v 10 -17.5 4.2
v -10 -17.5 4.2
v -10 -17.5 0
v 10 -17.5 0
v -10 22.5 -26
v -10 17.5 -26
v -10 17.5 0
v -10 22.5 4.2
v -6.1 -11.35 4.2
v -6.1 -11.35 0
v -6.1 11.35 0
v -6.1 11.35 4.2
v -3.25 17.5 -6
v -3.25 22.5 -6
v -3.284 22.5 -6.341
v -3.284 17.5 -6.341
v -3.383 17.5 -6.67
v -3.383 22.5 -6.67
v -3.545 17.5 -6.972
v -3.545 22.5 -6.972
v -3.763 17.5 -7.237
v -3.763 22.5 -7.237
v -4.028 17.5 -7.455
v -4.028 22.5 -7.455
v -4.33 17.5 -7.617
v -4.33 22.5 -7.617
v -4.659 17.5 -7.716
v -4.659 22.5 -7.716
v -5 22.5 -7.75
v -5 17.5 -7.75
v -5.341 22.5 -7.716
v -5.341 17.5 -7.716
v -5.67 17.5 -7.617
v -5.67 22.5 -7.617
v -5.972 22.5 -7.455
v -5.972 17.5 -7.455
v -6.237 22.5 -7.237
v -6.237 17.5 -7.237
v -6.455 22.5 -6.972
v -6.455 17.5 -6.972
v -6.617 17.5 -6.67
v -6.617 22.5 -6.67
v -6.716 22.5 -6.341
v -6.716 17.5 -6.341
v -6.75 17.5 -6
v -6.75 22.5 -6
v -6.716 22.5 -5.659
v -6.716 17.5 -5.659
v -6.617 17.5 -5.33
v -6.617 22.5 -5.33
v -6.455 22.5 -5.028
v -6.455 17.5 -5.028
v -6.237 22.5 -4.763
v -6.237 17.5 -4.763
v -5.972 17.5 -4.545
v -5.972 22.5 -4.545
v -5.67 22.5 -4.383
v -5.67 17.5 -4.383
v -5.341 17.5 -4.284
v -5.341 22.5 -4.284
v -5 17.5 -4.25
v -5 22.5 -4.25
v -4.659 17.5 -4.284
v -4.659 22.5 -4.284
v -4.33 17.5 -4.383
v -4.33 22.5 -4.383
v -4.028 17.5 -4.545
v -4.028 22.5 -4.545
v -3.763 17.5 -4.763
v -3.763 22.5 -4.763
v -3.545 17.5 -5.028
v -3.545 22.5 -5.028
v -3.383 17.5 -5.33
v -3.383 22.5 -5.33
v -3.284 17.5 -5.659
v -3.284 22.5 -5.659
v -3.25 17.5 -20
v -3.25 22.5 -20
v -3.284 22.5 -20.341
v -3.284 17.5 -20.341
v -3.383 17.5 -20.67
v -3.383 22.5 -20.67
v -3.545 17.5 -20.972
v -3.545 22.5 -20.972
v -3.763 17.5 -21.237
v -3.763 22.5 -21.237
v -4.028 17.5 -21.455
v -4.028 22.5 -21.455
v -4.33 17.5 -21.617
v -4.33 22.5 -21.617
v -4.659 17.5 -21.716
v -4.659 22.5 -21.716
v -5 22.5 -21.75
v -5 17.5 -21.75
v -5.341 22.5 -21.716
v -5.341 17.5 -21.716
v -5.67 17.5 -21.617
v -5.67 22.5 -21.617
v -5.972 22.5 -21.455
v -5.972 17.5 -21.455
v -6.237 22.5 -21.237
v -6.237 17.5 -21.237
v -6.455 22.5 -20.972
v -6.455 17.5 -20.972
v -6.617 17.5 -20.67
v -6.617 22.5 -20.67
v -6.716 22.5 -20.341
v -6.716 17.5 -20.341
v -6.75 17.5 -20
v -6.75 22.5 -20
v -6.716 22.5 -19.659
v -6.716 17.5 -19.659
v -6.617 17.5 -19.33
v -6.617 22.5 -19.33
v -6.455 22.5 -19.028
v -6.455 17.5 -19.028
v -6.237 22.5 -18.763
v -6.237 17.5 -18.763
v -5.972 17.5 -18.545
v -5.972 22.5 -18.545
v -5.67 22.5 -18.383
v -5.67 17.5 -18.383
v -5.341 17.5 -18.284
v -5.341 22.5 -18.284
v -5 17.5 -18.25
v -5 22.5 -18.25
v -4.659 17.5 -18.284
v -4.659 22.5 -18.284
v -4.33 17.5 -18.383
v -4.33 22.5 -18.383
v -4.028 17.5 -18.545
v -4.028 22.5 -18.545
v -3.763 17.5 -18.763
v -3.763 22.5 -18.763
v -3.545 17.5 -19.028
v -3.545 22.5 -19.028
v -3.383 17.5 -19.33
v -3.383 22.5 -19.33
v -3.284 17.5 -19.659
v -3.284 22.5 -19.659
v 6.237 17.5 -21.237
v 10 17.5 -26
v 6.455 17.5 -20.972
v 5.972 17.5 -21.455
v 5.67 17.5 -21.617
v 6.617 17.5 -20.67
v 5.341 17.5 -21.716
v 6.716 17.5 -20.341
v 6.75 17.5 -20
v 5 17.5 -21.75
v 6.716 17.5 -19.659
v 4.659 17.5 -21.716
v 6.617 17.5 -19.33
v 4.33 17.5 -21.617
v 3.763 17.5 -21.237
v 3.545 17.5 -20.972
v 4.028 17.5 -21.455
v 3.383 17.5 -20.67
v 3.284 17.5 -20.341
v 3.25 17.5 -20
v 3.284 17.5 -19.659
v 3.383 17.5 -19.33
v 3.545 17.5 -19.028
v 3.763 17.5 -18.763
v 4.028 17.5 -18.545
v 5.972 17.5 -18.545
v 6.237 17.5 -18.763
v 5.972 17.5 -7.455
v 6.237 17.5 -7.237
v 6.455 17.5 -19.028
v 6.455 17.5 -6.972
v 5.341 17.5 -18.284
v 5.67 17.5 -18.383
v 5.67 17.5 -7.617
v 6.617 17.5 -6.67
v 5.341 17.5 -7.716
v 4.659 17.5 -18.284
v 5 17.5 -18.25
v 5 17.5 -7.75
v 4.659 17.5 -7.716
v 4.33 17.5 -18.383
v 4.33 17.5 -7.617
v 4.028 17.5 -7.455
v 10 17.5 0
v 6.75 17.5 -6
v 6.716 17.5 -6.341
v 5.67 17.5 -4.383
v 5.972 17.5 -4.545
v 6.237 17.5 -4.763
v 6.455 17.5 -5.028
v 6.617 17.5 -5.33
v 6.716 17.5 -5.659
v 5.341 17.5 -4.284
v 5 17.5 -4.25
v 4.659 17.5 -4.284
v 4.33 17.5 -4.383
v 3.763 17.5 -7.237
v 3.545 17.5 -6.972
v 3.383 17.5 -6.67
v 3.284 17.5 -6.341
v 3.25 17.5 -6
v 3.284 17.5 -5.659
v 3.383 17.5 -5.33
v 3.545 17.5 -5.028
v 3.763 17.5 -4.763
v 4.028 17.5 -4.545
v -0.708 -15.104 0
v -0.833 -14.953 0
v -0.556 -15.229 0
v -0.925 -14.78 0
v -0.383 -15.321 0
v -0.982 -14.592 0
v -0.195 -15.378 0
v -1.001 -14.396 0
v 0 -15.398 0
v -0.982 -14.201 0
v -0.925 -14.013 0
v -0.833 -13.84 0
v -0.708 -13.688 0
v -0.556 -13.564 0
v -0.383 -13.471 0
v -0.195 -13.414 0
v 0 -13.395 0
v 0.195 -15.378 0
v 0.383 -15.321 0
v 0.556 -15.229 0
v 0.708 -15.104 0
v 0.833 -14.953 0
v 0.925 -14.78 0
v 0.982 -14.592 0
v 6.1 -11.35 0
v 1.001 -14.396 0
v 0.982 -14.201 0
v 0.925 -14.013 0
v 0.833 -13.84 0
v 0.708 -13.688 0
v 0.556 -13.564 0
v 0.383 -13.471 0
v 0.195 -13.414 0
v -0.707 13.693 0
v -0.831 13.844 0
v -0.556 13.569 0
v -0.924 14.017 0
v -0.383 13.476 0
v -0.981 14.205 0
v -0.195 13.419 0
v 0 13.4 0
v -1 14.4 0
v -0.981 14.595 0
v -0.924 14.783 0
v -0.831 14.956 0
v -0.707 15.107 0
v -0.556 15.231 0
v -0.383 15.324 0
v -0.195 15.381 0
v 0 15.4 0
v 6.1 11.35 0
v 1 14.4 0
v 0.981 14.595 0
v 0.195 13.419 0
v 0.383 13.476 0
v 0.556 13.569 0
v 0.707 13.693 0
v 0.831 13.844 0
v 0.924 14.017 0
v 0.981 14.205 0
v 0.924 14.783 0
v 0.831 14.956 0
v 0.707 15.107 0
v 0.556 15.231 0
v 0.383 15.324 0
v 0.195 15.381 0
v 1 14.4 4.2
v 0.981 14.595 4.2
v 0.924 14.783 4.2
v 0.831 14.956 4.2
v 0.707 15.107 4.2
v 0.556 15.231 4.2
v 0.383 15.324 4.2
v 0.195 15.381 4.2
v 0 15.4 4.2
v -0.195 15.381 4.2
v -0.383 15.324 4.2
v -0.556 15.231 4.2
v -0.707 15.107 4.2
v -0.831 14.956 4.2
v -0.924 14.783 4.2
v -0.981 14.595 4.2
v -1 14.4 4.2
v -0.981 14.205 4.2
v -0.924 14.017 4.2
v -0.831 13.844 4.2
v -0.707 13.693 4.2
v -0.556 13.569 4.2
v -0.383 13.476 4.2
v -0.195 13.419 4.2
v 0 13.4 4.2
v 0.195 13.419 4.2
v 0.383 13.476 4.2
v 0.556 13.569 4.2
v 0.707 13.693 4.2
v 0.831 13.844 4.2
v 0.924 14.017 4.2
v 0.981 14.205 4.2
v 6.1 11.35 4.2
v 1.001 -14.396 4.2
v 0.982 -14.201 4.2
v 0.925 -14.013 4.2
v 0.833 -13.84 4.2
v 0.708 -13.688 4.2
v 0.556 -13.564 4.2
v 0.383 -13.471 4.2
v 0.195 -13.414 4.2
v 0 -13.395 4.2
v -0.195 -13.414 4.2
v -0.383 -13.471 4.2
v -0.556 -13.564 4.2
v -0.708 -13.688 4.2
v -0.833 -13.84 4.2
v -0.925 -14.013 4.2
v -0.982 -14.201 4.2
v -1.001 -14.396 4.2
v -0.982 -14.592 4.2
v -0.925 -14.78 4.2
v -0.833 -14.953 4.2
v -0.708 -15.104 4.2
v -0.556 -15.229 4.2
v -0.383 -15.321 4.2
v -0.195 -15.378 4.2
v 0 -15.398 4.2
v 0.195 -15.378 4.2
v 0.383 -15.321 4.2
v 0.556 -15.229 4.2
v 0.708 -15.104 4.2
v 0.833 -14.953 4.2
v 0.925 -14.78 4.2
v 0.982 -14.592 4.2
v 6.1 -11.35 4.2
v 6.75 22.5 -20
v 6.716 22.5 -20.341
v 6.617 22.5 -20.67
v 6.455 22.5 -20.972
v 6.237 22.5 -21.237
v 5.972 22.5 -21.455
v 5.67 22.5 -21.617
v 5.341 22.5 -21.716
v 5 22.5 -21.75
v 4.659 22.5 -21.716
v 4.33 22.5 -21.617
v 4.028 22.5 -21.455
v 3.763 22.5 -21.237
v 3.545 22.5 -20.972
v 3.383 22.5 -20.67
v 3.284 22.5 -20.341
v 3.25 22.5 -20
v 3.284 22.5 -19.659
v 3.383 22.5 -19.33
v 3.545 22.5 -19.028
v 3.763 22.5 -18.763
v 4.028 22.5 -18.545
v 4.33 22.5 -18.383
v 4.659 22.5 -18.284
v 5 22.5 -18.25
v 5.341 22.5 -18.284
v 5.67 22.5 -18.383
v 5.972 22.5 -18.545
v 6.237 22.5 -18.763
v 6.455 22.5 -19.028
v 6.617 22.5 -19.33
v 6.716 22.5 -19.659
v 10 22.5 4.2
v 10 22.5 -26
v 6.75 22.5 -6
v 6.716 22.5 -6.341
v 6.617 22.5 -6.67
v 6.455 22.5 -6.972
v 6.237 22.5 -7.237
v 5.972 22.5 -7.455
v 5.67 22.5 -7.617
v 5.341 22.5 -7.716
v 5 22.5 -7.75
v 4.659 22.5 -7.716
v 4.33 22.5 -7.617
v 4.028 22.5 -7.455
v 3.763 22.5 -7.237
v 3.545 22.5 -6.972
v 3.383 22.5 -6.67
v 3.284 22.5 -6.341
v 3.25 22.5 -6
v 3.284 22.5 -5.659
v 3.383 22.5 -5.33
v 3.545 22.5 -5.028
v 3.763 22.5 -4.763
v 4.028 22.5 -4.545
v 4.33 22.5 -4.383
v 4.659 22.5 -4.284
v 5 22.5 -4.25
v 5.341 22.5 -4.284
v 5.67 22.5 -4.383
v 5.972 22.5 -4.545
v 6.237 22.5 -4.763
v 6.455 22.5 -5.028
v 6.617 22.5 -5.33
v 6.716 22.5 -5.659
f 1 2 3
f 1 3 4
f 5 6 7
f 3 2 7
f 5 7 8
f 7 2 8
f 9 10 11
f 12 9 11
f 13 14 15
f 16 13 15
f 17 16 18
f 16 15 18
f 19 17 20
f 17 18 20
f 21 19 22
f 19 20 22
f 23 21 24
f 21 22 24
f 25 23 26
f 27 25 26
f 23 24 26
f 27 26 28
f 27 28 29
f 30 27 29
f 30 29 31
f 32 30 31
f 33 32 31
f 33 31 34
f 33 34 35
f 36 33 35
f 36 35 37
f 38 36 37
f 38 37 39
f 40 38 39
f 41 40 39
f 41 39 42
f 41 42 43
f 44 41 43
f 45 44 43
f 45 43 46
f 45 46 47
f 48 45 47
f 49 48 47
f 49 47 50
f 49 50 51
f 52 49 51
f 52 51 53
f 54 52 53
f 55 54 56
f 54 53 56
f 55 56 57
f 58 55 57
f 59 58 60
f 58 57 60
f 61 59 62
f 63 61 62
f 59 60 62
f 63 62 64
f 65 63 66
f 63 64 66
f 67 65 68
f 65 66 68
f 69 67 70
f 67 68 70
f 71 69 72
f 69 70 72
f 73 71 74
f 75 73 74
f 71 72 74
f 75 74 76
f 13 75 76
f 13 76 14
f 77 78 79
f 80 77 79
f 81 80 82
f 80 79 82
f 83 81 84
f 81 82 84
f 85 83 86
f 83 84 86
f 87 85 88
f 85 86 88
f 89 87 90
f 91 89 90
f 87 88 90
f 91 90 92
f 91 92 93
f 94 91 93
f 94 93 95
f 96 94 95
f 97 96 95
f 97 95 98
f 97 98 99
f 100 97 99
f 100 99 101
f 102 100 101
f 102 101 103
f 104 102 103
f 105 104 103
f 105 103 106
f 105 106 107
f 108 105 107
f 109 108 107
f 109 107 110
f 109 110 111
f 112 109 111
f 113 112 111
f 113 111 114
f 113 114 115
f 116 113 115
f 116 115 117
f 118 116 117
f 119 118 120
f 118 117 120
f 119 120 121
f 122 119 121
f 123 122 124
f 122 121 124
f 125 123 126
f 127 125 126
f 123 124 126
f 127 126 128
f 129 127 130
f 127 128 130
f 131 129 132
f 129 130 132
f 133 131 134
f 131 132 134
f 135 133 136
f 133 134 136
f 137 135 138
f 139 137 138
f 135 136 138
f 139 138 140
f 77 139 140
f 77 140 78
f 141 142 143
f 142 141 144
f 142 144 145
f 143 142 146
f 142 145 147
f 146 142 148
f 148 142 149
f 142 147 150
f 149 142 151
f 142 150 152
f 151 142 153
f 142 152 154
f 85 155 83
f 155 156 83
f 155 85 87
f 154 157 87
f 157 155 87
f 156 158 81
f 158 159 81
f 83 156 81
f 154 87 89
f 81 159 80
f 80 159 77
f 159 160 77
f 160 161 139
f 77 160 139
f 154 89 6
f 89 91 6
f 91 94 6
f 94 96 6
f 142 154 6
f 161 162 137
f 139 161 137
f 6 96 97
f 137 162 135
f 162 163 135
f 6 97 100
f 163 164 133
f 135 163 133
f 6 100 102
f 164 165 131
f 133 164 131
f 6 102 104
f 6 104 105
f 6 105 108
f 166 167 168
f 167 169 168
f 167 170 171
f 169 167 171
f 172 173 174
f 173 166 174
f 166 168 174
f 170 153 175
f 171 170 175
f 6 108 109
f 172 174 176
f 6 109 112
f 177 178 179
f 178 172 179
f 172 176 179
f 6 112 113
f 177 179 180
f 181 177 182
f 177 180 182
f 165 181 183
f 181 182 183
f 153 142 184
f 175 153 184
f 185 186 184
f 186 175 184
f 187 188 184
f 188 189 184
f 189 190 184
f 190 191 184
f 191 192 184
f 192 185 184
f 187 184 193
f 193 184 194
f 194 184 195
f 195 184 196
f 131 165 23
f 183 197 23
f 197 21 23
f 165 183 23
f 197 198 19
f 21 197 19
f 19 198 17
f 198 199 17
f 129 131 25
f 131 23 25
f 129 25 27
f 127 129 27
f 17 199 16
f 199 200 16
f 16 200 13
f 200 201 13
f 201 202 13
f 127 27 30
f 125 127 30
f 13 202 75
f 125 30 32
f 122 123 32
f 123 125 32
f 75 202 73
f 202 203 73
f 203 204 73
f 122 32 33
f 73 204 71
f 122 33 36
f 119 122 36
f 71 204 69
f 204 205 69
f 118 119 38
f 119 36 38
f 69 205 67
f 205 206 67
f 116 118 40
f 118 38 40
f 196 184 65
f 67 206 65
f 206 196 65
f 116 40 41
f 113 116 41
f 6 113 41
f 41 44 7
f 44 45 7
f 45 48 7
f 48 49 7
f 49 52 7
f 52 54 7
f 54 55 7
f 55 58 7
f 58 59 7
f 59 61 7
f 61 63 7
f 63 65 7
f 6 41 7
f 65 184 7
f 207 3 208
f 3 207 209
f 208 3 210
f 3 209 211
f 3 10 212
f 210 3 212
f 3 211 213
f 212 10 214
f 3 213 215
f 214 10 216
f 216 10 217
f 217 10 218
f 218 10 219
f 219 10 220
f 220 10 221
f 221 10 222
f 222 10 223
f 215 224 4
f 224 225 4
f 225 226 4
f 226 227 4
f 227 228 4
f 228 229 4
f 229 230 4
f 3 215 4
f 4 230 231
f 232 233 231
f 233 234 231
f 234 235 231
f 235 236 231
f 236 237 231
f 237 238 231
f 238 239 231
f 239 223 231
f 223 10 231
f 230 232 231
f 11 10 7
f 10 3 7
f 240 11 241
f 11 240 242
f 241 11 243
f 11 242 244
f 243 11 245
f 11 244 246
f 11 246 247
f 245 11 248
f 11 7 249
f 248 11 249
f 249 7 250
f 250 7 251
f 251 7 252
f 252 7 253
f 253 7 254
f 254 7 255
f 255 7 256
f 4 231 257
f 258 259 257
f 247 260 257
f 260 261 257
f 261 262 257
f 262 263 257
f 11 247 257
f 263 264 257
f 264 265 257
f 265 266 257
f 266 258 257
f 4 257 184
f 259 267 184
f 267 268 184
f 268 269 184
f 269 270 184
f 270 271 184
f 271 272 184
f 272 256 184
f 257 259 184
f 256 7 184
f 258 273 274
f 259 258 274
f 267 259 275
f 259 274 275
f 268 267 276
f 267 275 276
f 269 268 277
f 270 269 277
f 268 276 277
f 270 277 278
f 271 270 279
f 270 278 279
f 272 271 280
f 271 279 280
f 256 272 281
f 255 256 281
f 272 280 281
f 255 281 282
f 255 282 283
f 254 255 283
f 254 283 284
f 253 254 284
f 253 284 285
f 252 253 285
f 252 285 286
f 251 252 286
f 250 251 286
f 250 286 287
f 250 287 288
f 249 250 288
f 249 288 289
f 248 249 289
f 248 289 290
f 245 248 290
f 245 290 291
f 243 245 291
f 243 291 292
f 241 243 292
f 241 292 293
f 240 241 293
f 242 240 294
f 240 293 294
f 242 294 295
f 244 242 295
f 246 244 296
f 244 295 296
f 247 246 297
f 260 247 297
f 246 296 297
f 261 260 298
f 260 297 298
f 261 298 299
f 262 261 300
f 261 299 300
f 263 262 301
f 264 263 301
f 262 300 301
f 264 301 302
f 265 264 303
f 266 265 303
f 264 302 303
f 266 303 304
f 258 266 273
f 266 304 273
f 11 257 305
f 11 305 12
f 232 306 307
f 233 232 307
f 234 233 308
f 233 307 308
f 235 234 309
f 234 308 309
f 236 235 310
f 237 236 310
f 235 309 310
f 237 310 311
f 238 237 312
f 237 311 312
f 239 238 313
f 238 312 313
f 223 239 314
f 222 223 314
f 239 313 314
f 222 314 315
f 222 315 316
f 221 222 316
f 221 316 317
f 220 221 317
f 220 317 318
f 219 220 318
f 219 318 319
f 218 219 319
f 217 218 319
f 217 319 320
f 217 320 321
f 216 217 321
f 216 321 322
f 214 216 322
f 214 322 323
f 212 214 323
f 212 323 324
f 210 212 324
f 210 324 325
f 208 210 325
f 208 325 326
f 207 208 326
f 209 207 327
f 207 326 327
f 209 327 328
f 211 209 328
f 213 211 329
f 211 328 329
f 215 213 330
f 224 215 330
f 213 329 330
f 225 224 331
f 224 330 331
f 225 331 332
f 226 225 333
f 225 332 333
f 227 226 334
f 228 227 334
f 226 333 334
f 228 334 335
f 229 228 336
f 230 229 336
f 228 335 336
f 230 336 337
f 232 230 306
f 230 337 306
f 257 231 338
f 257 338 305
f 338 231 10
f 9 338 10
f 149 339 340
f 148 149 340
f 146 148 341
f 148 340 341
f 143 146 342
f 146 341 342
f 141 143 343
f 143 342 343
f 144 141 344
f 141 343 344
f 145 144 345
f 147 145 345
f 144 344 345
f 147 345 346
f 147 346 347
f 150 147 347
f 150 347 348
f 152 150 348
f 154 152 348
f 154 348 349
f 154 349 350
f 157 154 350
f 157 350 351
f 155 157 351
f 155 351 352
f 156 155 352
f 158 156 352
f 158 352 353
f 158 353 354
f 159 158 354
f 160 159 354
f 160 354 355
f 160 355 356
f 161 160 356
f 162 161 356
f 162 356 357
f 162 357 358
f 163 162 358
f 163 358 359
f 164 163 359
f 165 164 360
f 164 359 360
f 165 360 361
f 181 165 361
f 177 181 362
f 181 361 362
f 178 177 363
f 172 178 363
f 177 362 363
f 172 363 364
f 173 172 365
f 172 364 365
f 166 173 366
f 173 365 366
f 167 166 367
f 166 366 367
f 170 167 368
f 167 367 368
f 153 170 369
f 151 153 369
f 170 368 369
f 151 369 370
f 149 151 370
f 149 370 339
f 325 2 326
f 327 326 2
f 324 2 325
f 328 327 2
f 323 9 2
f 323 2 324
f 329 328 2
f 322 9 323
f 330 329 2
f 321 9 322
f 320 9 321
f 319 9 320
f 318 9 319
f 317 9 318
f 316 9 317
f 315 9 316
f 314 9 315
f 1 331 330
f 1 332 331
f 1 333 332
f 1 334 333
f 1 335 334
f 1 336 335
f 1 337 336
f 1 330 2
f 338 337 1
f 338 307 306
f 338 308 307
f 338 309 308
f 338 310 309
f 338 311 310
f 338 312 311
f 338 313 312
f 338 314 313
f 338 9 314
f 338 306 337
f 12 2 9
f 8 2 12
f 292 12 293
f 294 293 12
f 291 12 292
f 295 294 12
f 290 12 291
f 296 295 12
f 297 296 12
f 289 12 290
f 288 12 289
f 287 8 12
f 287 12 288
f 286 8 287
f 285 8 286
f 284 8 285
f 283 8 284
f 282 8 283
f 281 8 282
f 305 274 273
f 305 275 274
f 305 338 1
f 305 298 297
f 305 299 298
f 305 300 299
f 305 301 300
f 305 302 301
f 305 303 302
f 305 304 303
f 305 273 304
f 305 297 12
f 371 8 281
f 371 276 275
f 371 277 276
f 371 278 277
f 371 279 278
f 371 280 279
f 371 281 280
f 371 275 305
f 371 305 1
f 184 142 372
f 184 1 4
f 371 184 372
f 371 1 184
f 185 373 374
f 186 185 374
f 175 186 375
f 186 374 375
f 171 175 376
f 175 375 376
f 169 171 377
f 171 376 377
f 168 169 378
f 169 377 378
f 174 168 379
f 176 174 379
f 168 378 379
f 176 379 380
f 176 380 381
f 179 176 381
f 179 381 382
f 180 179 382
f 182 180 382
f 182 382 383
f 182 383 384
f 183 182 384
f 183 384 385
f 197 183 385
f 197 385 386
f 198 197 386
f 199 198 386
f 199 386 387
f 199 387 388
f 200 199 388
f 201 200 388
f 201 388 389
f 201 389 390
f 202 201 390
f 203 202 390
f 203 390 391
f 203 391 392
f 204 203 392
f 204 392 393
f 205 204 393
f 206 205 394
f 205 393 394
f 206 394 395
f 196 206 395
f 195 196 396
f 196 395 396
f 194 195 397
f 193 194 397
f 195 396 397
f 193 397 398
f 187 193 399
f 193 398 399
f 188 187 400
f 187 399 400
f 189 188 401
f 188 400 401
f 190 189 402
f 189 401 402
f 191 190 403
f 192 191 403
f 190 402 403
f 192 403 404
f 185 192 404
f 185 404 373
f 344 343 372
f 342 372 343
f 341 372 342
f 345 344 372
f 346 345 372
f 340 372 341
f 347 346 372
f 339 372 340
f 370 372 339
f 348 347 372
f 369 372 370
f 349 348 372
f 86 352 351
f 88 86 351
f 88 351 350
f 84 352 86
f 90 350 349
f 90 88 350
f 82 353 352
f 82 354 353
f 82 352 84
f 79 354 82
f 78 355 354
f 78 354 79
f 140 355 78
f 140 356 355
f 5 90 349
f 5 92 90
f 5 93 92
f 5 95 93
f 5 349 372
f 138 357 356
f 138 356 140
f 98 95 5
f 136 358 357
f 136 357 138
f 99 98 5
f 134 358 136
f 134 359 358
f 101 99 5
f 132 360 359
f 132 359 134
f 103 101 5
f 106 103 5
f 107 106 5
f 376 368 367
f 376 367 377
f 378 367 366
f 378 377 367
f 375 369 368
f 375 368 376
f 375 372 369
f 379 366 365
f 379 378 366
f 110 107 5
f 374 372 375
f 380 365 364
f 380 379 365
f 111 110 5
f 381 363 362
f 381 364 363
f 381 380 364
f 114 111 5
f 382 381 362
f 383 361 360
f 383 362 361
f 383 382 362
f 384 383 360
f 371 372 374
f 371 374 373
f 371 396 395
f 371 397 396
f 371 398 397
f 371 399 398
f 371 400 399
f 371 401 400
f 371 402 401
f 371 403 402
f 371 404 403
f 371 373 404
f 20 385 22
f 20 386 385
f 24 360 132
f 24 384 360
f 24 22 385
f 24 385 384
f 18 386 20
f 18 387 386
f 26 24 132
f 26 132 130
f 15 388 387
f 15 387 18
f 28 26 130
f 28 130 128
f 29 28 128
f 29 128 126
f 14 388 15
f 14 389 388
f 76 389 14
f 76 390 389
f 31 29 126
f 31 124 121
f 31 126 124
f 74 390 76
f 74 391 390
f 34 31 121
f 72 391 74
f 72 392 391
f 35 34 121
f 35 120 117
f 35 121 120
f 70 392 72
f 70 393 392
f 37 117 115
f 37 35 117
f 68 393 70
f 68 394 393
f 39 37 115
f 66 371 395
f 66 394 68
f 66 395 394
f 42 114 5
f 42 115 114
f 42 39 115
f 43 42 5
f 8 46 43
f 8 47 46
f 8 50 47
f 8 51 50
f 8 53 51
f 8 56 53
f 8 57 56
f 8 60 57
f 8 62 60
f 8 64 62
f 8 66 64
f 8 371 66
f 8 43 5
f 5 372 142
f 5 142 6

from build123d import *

# Parameters (mm, degrees)
SKETCH1_W           = 20
SKETCH1_H           = 45
BOSS_EXTRUDE1_DEPTH = 4.2
SKETCH2_W           = 12.2
SKETCH2_H           = 22.7
CUT_EXTRUDE1_DEPTH  = 5
SKETCH3_R           = 1
SKETCH3_R_2         = 1.001337469
CUT_EXTRUDE2_DEPTH  = 5
SKETCH4_W           = 20
SKETCH4_H           = 5
BOSS_EXTRUDE2_DEPTH = 26
SKETCH5_R           = 1.75
CUT_EXTRUDE3_DEPTH  = 15
SKETCH6_W           = 20
SKETCH6_H           = 5
CUT_EXTRUDE4_DEPTH  = 15


with BuildPart() as part:
    # Sketch1 → Boss-Extrude1 (new body)
    with BuildSketch(Plane.XY):
        Rectangle(SKETCH1_W, SKETCH1_H)
    extrude(amount=BOSS_EXTRUDE1_DEPTH)

    # Sketch2 → Cut-Extrude1 (cut)
    with BuildSketch(Plane(origin=(0, 0, 0), x_dir=(-1, 0, 0), z_dir=(0, 0, -1))):
        Rectangle(SKETCH2_W, SKETCH2_H)
    extrude(amount=-CUT_EXTRUDE1_DEPTH, mode=Mode.SUBTRACT)

    # Sketch3 → Cut-Extrude2 (cut)
    with BuildSketch(Plane.XY.offset(4.2)):
        with Locations((0, 14.4)):
            Circle(SKETCH3_R)
        with Locations((0, -14.396360879)):
            Circle(SKETCH3_R_2)
    extrude(amount=-CUT_EXTRUDE2_DEPTH, mode=Mode.SUBTRACT)

    # Sketch4 → Boss-Extrude2 (add)
    with BuildSketch(Plane(origin=(0, 0, 0), x_dir=(-1, 0, 0), z_dir=(0, 0, -1))):
        with Locations((0, 20)):
            Rectangle(SKETCH4_W, SKETCH4_H)
    extrude(amount=BOSS_EXTRUDE2_DEPTH)

    # Sketch5 → Cut-Extrude3 (cut)
    with BuildSketch(Plane(origin=(0, 22.5, 0), x_dir=(1, 0, 0), z_dir=(0, 1, 0))):
        with Locations((-5, 6)):
            Circle(SKETCH5_R)
        with Locations((5, 6)):
            Circle(SKETCH5_R)
        with Locations((5, 20)):
            Circle(SKETCH5_R)
        with Locations((-5, 20)):
            Circle(SKETCH5_R)
    extrude(amount=-CUT_EXTRUDE3_DEPTH, mode=Mode.SUBTRACT)

    # Sketch6 → Cut-Extrude4 (cut)
    with BuildSketch(Plane.XY.offset(4.2)):
        with Locations((0, -20)):
            Rectangle(SKETCH6_W, SKETCH6_H)
    extrude(amount=-CUT_EXTRUDE4_DEPTH, mode=Mode.SUBTRACT)


solid = part.part
